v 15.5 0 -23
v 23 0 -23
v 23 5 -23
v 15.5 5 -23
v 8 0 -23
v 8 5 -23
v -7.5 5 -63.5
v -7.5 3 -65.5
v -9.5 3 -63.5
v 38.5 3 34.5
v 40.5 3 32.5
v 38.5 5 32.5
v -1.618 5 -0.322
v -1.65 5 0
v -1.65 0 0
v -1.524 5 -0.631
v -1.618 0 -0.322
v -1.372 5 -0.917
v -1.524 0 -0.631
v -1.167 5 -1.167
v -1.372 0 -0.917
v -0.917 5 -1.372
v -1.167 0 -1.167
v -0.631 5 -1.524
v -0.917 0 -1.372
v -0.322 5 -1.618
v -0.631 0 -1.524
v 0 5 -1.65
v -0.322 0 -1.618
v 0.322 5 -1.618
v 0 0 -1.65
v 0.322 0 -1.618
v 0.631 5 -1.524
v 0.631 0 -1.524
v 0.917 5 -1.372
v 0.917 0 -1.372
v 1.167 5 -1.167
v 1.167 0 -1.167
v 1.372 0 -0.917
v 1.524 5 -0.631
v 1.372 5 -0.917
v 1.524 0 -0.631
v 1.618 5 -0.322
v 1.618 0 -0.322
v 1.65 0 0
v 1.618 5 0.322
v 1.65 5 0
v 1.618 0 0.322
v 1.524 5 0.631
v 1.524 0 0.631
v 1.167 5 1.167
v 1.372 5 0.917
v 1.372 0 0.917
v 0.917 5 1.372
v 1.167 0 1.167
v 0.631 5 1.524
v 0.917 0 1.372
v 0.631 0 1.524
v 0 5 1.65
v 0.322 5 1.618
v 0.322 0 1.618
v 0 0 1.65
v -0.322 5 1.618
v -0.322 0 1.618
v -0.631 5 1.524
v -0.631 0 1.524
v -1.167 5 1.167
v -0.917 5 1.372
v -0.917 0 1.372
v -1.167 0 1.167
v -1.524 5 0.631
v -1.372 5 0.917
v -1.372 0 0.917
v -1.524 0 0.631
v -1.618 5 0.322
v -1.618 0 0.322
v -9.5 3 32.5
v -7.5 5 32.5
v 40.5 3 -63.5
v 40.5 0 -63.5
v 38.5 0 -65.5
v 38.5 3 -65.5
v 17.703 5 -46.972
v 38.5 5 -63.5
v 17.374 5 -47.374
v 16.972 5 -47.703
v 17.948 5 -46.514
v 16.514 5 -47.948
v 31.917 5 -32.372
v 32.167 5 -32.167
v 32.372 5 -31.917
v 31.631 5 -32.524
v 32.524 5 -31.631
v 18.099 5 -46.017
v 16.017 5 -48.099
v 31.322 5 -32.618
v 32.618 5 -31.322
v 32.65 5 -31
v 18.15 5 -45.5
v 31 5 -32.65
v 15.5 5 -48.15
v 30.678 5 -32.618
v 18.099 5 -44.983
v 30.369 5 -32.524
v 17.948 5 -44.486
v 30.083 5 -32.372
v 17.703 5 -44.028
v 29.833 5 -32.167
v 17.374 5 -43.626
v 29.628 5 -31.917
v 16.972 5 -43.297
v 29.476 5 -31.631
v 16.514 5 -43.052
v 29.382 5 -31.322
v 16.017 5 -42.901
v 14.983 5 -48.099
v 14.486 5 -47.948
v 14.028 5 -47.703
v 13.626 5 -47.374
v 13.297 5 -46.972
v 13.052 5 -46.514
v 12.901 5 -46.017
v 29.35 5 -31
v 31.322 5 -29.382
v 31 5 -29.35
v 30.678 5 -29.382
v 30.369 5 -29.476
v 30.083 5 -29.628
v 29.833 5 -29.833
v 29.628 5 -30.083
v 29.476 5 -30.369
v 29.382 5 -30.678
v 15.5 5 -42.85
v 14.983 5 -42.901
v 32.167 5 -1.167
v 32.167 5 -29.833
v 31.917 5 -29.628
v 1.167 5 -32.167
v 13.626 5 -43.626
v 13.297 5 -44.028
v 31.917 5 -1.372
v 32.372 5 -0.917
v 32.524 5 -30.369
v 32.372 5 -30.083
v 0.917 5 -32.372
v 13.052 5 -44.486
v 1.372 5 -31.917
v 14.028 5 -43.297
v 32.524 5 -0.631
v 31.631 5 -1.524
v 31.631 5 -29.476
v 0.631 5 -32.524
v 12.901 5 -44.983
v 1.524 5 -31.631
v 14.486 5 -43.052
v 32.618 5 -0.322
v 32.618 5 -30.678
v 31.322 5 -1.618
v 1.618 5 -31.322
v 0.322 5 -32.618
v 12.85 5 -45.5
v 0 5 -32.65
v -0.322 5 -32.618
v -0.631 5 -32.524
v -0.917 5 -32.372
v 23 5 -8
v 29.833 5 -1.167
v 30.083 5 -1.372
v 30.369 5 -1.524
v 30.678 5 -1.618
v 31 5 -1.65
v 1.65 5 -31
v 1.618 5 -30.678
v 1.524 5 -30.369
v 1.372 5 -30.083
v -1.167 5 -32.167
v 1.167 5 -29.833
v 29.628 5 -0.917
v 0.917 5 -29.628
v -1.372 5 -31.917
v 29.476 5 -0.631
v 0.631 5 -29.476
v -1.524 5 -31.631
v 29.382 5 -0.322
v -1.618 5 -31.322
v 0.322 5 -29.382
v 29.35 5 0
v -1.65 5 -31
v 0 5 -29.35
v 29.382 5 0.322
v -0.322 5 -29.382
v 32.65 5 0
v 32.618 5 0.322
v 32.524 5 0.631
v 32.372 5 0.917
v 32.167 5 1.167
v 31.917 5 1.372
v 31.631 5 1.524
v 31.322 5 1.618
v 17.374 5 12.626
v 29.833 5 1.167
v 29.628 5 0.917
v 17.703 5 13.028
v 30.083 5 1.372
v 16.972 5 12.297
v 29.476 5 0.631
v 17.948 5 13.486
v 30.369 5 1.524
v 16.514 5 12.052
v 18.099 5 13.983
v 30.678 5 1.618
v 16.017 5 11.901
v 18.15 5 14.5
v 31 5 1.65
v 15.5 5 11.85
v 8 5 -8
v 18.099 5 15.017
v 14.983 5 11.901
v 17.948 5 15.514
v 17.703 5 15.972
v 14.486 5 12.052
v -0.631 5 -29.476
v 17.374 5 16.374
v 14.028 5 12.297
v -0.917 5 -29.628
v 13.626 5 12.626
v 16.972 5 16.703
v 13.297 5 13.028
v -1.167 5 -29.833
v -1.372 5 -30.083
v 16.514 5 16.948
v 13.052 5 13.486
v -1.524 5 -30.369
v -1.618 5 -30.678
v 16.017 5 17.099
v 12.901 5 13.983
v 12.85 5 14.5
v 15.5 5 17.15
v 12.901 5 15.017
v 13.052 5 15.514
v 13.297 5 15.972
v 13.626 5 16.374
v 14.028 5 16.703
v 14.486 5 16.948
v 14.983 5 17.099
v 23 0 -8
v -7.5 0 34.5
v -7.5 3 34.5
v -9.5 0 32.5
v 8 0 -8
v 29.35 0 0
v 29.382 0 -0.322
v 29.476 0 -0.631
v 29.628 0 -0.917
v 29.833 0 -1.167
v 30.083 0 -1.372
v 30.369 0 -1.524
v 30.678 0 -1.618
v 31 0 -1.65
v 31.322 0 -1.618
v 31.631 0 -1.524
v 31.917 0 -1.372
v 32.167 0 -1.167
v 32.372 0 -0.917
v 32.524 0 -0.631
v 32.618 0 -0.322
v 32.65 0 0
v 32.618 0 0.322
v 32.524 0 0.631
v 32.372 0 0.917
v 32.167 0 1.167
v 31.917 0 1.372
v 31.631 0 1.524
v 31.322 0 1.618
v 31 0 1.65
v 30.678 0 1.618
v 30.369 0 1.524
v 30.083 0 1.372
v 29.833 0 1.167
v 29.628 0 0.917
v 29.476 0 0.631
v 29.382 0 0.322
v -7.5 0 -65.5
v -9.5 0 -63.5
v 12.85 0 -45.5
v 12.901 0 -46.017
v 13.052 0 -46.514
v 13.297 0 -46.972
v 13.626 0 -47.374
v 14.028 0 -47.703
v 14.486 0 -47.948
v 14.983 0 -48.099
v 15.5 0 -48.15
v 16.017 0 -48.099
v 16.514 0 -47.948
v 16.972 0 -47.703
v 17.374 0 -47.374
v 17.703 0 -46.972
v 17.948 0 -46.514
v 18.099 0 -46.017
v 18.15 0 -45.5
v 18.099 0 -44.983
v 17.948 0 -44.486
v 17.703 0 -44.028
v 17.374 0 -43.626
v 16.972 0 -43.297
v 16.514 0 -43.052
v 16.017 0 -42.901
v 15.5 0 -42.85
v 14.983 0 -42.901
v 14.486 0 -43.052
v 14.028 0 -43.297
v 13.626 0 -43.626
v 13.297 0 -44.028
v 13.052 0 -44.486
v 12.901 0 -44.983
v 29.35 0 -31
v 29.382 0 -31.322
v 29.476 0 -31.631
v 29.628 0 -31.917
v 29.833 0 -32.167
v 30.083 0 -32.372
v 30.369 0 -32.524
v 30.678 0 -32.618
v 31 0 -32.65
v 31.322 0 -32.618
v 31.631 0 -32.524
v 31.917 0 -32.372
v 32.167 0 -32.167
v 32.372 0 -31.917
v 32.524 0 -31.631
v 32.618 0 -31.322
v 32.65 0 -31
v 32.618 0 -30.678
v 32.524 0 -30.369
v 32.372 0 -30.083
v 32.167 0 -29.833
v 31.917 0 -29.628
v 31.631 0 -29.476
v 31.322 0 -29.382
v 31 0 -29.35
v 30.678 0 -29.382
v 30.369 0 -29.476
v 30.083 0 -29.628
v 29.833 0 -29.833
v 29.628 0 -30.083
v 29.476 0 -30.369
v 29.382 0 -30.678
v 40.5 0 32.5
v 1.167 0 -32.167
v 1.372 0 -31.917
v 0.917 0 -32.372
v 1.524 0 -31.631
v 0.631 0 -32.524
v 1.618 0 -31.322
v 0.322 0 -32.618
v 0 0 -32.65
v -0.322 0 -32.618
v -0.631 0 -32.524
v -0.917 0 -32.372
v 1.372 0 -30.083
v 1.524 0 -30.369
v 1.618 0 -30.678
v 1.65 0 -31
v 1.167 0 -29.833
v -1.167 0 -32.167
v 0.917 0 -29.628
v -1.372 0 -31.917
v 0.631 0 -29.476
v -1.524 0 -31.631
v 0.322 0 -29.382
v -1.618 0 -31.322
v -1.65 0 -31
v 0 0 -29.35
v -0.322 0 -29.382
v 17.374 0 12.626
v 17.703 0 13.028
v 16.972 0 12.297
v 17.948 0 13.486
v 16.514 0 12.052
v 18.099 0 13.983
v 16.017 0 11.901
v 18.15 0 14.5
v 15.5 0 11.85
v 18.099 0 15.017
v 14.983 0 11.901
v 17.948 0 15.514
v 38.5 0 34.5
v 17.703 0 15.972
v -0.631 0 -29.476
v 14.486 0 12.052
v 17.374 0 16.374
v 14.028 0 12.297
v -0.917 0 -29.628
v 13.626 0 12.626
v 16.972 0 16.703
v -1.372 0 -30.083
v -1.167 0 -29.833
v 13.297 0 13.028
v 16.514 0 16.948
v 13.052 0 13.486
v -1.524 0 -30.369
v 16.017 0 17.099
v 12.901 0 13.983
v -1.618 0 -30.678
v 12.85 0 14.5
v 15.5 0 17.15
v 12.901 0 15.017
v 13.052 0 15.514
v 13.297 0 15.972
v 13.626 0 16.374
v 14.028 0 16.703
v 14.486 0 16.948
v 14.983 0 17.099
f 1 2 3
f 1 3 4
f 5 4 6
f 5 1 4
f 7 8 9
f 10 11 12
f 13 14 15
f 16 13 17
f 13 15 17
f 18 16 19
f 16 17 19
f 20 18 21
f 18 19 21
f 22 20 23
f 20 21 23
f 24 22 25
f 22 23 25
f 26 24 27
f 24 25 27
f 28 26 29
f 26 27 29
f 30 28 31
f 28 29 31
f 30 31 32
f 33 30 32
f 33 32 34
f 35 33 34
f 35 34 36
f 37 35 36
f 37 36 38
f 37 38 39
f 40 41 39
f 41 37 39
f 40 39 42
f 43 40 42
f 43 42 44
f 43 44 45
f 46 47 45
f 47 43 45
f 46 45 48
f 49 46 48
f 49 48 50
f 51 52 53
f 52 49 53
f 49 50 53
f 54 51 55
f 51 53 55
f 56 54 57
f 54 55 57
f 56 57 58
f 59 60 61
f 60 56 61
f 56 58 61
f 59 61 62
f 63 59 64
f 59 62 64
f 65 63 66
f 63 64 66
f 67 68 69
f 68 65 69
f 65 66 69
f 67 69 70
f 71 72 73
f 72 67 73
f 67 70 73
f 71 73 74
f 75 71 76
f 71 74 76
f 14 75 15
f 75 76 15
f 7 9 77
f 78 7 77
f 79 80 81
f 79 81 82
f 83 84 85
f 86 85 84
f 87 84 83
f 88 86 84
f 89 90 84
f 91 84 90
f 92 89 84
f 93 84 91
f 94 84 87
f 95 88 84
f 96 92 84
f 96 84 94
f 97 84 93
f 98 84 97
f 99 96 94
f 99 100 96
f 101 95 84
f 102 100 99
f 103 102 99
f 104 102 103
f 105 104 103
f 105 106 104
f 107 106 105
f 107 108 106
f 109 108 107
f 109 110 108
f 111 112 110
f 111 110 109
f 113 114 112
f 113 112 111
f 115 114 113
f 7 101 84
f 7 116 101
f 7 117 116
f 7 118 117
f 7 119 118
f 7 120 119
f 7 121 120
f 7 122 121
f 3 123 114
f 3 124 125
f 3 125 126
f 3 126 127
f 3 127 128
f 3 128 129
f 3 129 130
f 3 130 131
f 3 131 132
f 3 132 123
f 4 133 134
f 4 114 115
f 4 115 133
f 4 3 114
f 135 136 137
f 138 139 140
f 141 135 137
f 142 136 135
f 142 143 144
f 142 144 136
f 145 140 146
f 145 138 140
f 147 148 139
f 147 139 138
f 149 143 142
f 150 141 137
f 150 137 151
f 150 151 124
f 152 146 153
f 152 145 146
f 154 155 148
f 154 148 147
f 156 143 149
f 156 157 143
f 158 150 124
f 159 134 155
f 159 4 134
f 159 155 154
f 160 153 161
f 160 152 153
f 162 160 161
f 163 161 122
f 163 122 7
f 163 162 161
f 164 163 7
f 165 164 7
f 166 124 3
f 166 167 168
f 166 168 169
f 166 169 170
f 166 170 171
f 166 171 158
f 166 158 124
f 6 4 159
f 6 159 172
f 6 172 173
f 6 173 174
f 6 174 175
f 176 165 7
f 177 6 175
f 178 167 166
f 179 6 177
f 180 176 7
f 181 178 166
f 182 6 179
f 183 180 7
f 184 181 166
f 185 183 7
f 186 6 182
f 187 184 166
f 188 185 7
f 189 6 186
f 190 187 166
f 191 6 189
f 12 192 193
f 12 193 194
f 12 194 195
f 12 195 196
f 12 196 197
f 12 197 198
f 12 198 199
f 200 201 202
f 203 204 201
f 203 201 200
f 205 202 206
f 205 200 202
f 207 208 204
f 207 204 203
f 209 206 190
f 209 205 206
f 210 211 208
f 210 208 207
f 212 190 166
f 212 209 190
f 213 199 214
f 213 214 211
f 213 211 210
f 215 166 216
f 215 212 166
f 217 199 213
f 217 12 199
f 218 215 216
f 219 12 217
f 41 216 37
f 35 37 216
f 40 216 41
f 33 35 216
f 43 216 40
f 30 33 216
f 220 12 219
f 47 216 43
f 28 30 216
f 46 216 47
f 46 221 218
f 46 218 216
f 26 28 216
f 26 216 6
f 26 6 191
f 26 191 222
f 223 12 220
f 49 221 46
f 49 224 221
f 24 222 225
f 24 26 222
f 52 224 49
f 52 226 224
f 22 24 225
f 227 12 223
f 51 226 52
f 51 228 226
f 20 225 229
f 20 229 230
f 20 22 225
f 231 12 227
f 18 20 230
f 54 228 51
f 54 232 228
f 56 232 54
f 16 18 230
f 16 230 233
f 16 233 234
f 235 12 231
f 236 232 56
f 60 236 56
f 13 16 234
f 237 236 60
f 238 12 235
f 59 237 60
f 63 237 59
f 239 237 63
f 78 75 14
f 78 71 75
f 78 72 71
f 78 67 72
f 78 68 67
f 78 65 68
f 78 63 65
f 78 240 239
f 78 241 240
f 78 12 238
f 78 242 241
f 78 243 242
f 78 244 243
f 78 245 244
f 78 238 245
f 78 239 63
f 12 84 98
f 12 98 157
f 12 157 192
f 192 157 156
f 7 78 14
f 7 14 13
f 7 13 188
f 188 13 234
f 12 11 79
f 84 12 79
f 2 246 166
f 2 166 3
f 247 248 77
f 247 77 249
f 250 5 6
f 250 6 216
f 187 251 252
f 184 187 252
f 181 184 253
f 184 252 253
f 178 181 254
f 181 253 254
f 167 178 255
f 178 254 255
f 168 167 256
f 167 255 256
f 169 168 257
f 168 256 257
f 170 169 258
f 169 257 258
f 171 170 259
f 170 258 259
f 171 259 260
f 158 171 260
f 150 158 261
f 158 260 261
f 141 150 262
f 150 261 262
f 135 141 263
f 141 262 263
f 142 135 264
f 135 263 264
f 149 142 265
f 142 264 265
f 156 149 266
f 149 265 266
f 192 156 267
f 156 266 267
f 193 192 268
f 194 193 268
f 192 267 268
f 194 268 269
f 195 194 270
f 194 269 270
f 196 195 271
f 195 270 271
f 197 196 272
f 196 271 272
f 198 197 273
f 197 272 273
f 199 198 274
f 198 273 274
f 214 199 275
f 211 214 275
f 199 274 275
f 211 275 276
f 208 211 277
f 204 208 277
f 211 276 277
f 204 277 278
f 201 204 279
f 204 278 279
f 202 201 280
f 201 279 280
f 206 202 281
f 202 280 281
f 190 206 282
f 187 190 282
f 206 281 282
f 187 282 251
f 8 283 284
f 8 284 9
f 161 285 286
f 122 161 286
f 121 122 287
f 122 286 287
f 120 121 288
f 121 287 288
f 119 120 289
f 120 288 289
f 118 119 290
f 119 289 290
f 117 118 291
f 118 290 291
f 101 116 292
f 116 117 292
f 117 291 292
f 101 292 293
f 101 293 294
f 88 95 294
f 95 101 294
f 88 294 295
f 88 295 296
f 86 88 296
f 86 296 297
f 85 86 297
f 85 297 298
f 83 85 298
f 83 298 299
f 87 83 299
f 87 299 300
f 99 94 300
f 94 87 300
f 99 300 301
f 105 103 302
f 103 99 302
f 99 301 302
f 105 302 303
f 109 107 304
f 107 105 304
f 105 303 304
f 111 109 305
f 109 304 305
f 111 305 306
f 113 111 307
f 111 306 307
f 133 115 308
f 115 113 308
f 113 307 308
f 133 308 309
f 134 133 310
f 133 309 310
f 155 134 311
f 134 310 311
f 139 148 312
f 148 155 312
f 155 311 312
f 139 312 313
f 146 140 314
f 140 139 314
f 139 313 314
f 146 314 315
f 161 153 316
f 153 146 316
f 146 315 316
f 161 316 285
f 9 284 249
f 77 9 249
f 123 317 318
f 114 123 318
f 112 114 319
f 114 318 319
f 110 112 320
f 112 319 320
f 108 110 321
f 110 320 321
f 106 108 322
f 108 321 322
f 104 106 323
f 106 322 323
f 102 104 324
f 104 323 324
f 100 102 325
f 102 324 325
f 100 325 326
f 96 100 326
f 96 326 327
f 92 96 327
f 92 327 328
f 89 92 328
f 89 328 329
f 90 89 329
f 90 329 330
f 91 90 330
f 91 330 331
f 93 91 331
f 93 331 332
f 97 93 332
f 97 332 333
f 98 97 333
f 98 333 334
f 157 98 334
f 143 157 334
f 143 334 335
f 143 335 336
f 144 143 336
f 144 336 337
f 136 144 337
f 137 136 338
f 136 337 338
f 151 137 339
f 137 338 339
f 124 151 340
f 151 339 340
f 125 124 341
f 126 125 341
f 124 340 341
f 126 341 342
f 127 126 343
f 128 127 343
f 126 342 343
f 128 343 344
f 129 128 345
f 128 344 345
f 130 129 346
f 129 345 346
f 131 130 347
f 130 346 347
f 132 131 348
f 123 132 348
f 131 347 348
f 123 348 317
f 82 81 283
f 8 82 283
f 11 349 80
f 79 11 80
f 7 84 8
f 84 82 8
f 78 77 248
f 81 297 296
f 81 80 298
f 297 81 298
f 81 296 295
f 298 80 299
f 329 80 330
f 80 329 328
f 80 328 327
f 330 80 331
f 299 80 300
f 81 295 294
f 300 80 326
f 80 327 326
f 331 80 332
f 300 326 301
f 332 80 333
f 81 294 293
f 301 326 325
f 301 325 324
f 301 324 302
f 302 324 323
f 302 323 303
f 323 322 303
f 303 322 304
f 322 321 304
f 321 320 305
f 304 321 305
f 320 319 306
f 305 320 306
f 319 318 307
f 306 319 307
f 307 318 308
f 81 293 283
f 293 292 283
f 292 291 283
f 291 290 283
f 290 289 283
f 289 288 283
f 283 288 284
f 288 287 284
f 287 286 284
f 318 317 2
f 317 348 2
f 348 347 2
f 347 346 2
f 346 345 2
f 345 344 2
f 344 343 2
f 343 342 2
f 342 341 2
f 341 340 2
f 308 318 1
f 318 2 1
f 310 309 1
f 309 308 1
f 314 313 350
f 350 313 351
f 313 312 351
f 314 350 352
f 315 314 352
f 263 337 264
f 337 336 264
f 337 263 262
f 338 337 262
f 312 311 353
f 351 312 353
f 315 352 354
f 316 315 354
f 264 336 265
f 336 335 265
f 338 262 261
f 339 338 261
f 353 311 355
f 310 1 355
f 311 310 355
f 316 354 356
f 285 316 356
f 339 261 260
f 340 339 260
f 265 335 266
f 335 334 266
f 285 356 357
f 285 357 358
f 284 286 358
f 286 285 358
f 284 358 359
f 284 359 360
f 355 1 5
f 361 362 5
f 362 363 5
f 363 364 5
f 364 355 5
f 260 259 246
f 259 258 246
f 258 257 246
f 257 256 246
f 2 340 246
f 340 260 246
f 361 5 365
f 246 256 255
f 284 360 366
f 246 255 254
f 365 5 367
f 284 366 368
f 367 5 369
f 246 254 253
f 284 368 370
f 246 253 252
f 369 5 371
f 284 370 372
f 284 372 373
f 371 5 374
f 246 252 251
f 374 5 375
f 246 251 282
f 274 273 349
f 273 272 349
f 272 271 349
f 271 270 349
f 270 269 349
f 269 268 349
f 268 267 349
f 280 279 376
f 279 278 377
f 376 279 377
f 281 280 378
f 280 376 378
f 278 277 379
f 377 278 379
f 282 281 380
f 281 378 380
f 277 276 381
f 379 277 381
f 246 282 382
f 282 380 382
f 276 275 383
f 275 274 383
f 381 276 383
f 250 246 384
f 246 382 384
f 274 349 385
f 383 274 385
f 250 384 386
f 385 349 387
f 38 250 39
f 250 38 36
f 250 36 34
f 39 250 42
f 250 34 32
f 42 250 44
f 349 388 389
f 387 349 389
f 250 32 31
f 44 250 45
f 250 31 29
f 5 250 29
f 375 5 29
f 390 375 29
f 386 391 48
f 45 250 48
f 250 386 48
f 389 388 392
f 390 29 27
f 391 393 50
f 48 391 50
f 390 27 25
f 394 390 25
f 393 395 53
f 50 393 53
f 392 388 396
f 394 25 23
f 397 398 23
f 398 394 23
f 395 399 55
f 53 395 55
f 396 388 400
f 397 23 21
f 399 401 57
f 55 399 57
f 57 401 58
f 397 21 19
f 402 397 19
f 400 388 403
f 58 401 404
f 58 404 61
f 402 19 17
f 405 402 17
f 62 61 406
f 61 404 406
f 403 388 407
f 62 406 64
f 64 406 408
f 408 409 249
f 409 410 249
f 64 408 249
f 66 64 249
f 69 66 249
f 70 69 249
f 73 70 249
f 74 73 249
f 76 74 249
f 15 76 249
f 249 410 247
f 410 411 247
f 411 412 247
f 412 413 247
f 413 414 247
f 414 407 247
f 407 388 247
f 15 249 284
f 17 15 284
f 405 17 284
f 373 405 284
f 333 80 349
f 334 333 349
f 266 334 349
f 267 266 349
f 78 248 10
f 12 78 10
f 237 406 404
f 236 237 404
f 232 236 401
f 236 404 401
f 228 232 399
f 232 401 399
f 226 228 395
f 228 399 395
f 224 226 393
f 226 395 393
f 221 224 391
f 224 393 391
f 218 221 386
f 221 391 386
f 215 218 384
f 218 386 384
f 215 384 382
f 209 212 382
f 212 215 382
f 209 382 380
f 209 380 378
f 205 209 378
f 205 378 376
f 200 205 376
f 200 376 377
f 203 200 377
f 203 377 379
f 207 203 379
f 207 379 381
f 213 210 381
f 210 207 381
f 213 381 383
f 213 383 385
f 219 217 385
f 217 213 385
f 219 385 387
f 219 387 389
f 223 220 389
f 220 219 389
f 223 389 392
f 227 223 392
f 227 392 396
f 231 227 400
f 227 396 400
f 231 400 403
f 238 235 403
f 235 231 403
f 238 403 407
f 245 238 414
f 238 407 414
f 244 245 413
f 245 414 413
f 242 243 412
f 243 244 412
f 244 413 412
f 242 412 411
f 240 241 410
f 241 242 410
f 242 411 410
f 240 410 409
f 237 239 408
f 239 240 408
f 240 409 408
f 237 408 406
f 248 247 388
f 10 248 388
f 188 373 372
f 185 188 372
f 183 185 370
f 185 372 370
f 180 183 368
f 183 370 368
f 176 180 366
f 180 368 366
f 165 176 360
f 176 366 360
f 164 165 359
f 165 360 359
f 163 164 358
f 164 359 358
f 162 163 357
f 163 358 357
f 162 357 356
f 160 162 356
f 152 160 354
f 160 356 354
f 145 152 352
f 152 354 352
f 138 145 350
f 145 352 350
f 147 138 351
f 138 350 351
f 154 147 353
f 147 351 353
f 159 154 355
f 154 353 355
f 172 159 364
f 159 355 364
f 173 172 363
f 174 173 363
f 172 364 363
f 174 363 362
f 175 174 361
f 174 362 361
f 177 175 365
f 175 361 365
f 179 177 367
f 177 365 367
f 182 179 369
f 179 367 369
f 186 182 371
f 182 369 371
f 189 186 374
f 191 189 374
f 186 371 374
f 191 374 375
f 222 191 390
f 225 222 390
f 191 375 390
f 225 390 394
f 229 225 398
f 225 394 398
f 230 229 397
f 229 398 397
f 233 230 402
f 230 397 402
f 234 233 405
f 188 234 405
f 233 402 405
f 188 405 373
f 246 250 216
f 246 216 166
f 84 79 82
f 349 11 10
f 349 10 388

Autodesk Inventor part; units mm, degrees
ref_plane "YZ Plane" through (0, 0, 0) normal (1, 0, 0) x (0, 1, 0)
ref_plane "XZ Plane" through (0, 0, 0) normal (0, 1, 0) x (-1, 0, 0)
ref_plane "XY Plane" through (0, 0, 0) normal (0, 0, 1) x (1, 0, 0)
sketch "Sketch1" plane through (0, 0, 0) normal (0, 1, 0) x (-1, 0, 0)
  point P0 (0, 0)
sketch "Sketch2" plane through (0, 0, 0) normal (0, 1, 0) x (-1, 0, 0)
  line L0 (0, 0) -> (-31, 0)
  line L1 (-31, -1.65) -> (-31, -29.35)
  line L2 (-31, -31) -> (0, -31)
  line L3 (0, -29.35) -> (0, -1.65)
  circle A0 centre (0, 0) radius 1.65
  circle A1 centre (0, -31) radius 1.65
  circle A2 centre (-31, -31) radius 1.65
  circle A3 centre (-31, 0) radius 1.65
  line L4 (-15.5, -15.5) -> (-15.5, -45.5)
  line L5 (-15.5, 0) -> (-15.5, 14.5)
  circle A4 centre (-15.5, 14.5) radius 2.65
  circle A5 centre (-15.5, -45.5) radius 2.65
  line L6 (9.5, 34.5) -> (-40.5, 34.5)
  line L7 (-40.5, 34.5) -> (-40.5, -65.5)
  line L8 (-40.5, -65.5) -> (9.5, -65.5)
  line L9 (9.5, -65.5) -> (9.5, 34.5)
  line L10 (9.5, 34.5) -> (-40.5, -65.5) construction
  line L11 (-40.5, 34.5) -> (9.5, -65.5) construction
  line L12 (-8, -8) -> (-23, -8)
  line L13 (-23, -8) -> (-23, -23)
  line L14 (-23, -23) -> (-8, -23)
  line L15 (-8, -23) -> (-8, -8)
  line L16 (-8, -8) -> (-23, -23) construction
  line L17 (-23, -8) -> (-8, -23) construction
  dimension "d2" = 3.3
  dimension "d3" = 3.3
  dimension "d4" = 3.3
  dimension "d5" = 3.3
  dimension "d0" = 31
  dimension "d1" = 31
  dimension "d6" = 30
  dimension "d7" = 30
  dimension "d8" = 5.3
  dimension "d9" = 5.3
  dimension "d10" = 50
  dimension "d11" = 100
  dimension "d12" = 15
  dimension "d13" = 15
extrude "Extrusion1" add sketch "Sketch2" along normal blind 5 contours L0 A0 L3 A1 L2 A2 L1 A3 | L9 L8 L7 L6
chamfer "Chamfer1" distance 2 angle 45 8 edges at (40.5, 2.5, 34.5) (40.5, 2.5, -65.5) (-9.5, 2.5, -65.5) (-9.5, 2.5, 34.5) (40.5, 5, -15.5) (15.5, 5, -65.5) (-9.5, 5, -15.5) (15.5, 5, 34.5)
properties part number "nema y axis cover"
